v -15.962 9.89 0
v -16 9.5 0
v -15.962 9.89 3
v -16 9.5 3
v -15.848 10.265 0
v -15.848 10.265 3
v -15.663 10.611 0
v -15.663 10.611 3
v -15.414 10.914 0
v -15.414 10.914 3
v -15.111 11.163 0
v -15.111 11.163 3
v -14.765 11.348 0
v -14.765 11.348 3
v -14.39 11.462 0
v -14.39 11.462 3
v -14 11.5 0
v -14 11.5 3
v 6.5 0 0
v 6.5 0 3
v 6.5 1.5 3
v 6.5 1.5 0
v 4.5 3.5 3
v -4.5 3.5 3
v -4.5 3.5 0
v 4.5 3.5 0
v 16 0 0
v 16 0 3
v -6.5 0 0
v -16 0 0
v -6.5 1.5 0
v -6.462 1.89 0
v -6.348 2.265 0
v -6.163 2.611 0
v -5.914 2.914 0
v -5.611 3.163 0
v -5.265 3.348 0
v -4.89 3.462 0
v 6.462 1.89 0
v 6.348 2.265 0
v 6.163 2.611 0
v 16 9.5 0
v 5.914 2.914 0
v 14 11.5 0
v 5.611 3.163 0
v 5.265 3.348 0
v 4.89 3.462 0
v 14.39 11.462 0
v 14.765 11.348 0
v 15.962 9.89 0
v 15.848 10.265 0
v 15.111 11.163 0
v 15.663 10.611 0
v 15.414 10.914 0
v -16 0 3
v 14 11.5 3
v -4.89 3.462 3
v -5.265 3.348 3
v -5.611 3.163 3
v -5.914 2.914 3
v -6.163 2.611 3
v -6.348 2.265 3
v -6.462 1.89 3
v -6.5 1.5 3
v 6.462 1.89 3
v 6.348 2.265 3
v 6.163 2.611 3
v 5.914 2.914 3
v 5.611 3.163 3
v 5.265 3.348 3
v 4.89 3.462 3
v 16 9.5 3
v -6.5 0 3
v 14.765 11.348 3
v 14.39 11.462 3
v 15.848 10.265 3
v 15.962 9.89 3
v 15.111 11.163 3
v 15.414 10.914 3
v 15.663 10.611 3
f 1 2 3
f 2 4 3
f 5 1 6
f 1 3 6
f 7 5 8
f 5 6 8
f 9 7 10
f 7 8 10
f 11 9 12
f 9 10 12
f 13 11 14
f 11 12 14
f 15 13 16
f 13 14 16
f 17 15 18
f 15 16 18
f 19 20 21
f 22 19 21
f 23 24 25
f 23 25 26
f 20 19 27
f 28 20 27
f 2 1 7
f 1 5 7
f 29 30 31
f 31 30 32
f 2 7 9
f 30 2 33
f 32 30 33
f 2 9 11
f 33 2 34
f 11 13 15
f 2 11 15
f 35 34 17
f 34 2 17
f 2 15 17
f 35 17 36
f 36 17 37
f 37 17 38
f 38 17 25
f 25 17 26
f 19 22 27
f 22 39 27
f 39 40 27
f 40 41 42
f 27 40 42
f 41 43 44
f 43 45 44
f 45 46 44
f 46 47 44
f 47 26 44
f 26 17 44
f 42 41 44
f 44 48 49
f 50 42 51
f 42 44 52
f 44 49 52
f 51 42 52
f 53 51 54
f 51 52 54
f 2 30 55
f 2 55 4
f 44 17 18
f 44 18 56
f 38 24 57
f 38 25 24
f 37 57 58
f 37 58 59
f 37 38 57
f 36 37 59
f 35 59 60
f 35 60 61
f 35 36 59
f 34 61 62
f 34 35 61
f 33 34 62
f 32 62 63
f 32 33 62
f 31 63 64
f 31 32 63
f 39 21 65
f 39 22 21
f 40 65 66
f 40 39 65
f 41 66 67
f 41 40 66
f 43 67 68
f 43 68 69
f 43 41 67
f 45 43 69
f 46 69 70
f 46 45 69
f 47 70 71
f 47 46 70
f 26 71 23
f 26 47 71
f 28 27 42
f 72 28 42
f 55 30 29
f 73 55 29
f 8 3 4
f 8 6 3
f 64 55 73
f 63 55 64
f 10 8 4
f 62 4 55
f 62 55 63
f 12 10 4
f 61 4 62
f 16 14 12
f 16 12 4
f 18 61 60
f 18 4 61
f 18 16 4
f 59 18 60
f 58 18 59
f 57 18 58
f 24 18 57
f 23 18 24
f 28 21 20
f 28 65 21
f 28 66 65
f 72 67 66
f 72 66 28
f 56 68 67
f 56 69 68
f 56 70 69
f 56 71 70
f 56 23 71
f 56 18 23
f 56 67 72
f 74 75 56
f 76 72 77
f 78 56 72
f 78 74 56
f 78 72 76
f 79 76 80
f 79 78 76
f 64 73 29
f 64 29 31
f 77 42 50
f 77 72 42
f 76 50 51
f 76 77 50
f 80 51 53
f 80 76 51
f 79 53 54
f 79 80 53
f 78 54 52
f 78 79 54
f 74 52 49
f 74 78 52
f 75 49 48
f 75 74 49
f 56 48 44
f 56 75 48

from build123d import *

# Parameters (mm, degrees)
F0_W     = 32
F0_H     = 11.5
F1_DEPTH = 3
F2_R     = 2
F3_W     = 13
F3_H     = 3.5
F4_DEPTH = 3.001
F5_R     = 2


with BuildPart() as f1:
    # F0 (on Top) → F1 (new body)
    with BuildSketch(Plane.XY):
        with Locations((0, 5.75)):
            Rectangle(F0_W, F0_H)
    extrude(amount=F1_DEPTH)

    # F2
    f2_edges = [f1.edges().sort_by_distance(p)[0] for p in [
        (-16, 11.5, 1.5),
        (16, 11.5, 1.5),
    ]]
    fillet(f2_edges, radius=F2_R)

    # F3 (on face) → F4 (cut, through all)
    with BuildSketch(Plane.XY.offset(3)):
        with Locations((0, 1.75)):
            Rectangle(F3_W, F3_H)
    extrude(amount=-F4_DEPTH, mode=Mode.SUBTRACT)

    # F5
    f5_edges = [f1.edges().sort_by_distance(p)[0] for p in [
        (-6.5, 3.5, 1.5),
        (6.5, 3.5, 1.5),
    ]]
    fillet(f5_edges, radius=F5_R)


solid = f1.part
